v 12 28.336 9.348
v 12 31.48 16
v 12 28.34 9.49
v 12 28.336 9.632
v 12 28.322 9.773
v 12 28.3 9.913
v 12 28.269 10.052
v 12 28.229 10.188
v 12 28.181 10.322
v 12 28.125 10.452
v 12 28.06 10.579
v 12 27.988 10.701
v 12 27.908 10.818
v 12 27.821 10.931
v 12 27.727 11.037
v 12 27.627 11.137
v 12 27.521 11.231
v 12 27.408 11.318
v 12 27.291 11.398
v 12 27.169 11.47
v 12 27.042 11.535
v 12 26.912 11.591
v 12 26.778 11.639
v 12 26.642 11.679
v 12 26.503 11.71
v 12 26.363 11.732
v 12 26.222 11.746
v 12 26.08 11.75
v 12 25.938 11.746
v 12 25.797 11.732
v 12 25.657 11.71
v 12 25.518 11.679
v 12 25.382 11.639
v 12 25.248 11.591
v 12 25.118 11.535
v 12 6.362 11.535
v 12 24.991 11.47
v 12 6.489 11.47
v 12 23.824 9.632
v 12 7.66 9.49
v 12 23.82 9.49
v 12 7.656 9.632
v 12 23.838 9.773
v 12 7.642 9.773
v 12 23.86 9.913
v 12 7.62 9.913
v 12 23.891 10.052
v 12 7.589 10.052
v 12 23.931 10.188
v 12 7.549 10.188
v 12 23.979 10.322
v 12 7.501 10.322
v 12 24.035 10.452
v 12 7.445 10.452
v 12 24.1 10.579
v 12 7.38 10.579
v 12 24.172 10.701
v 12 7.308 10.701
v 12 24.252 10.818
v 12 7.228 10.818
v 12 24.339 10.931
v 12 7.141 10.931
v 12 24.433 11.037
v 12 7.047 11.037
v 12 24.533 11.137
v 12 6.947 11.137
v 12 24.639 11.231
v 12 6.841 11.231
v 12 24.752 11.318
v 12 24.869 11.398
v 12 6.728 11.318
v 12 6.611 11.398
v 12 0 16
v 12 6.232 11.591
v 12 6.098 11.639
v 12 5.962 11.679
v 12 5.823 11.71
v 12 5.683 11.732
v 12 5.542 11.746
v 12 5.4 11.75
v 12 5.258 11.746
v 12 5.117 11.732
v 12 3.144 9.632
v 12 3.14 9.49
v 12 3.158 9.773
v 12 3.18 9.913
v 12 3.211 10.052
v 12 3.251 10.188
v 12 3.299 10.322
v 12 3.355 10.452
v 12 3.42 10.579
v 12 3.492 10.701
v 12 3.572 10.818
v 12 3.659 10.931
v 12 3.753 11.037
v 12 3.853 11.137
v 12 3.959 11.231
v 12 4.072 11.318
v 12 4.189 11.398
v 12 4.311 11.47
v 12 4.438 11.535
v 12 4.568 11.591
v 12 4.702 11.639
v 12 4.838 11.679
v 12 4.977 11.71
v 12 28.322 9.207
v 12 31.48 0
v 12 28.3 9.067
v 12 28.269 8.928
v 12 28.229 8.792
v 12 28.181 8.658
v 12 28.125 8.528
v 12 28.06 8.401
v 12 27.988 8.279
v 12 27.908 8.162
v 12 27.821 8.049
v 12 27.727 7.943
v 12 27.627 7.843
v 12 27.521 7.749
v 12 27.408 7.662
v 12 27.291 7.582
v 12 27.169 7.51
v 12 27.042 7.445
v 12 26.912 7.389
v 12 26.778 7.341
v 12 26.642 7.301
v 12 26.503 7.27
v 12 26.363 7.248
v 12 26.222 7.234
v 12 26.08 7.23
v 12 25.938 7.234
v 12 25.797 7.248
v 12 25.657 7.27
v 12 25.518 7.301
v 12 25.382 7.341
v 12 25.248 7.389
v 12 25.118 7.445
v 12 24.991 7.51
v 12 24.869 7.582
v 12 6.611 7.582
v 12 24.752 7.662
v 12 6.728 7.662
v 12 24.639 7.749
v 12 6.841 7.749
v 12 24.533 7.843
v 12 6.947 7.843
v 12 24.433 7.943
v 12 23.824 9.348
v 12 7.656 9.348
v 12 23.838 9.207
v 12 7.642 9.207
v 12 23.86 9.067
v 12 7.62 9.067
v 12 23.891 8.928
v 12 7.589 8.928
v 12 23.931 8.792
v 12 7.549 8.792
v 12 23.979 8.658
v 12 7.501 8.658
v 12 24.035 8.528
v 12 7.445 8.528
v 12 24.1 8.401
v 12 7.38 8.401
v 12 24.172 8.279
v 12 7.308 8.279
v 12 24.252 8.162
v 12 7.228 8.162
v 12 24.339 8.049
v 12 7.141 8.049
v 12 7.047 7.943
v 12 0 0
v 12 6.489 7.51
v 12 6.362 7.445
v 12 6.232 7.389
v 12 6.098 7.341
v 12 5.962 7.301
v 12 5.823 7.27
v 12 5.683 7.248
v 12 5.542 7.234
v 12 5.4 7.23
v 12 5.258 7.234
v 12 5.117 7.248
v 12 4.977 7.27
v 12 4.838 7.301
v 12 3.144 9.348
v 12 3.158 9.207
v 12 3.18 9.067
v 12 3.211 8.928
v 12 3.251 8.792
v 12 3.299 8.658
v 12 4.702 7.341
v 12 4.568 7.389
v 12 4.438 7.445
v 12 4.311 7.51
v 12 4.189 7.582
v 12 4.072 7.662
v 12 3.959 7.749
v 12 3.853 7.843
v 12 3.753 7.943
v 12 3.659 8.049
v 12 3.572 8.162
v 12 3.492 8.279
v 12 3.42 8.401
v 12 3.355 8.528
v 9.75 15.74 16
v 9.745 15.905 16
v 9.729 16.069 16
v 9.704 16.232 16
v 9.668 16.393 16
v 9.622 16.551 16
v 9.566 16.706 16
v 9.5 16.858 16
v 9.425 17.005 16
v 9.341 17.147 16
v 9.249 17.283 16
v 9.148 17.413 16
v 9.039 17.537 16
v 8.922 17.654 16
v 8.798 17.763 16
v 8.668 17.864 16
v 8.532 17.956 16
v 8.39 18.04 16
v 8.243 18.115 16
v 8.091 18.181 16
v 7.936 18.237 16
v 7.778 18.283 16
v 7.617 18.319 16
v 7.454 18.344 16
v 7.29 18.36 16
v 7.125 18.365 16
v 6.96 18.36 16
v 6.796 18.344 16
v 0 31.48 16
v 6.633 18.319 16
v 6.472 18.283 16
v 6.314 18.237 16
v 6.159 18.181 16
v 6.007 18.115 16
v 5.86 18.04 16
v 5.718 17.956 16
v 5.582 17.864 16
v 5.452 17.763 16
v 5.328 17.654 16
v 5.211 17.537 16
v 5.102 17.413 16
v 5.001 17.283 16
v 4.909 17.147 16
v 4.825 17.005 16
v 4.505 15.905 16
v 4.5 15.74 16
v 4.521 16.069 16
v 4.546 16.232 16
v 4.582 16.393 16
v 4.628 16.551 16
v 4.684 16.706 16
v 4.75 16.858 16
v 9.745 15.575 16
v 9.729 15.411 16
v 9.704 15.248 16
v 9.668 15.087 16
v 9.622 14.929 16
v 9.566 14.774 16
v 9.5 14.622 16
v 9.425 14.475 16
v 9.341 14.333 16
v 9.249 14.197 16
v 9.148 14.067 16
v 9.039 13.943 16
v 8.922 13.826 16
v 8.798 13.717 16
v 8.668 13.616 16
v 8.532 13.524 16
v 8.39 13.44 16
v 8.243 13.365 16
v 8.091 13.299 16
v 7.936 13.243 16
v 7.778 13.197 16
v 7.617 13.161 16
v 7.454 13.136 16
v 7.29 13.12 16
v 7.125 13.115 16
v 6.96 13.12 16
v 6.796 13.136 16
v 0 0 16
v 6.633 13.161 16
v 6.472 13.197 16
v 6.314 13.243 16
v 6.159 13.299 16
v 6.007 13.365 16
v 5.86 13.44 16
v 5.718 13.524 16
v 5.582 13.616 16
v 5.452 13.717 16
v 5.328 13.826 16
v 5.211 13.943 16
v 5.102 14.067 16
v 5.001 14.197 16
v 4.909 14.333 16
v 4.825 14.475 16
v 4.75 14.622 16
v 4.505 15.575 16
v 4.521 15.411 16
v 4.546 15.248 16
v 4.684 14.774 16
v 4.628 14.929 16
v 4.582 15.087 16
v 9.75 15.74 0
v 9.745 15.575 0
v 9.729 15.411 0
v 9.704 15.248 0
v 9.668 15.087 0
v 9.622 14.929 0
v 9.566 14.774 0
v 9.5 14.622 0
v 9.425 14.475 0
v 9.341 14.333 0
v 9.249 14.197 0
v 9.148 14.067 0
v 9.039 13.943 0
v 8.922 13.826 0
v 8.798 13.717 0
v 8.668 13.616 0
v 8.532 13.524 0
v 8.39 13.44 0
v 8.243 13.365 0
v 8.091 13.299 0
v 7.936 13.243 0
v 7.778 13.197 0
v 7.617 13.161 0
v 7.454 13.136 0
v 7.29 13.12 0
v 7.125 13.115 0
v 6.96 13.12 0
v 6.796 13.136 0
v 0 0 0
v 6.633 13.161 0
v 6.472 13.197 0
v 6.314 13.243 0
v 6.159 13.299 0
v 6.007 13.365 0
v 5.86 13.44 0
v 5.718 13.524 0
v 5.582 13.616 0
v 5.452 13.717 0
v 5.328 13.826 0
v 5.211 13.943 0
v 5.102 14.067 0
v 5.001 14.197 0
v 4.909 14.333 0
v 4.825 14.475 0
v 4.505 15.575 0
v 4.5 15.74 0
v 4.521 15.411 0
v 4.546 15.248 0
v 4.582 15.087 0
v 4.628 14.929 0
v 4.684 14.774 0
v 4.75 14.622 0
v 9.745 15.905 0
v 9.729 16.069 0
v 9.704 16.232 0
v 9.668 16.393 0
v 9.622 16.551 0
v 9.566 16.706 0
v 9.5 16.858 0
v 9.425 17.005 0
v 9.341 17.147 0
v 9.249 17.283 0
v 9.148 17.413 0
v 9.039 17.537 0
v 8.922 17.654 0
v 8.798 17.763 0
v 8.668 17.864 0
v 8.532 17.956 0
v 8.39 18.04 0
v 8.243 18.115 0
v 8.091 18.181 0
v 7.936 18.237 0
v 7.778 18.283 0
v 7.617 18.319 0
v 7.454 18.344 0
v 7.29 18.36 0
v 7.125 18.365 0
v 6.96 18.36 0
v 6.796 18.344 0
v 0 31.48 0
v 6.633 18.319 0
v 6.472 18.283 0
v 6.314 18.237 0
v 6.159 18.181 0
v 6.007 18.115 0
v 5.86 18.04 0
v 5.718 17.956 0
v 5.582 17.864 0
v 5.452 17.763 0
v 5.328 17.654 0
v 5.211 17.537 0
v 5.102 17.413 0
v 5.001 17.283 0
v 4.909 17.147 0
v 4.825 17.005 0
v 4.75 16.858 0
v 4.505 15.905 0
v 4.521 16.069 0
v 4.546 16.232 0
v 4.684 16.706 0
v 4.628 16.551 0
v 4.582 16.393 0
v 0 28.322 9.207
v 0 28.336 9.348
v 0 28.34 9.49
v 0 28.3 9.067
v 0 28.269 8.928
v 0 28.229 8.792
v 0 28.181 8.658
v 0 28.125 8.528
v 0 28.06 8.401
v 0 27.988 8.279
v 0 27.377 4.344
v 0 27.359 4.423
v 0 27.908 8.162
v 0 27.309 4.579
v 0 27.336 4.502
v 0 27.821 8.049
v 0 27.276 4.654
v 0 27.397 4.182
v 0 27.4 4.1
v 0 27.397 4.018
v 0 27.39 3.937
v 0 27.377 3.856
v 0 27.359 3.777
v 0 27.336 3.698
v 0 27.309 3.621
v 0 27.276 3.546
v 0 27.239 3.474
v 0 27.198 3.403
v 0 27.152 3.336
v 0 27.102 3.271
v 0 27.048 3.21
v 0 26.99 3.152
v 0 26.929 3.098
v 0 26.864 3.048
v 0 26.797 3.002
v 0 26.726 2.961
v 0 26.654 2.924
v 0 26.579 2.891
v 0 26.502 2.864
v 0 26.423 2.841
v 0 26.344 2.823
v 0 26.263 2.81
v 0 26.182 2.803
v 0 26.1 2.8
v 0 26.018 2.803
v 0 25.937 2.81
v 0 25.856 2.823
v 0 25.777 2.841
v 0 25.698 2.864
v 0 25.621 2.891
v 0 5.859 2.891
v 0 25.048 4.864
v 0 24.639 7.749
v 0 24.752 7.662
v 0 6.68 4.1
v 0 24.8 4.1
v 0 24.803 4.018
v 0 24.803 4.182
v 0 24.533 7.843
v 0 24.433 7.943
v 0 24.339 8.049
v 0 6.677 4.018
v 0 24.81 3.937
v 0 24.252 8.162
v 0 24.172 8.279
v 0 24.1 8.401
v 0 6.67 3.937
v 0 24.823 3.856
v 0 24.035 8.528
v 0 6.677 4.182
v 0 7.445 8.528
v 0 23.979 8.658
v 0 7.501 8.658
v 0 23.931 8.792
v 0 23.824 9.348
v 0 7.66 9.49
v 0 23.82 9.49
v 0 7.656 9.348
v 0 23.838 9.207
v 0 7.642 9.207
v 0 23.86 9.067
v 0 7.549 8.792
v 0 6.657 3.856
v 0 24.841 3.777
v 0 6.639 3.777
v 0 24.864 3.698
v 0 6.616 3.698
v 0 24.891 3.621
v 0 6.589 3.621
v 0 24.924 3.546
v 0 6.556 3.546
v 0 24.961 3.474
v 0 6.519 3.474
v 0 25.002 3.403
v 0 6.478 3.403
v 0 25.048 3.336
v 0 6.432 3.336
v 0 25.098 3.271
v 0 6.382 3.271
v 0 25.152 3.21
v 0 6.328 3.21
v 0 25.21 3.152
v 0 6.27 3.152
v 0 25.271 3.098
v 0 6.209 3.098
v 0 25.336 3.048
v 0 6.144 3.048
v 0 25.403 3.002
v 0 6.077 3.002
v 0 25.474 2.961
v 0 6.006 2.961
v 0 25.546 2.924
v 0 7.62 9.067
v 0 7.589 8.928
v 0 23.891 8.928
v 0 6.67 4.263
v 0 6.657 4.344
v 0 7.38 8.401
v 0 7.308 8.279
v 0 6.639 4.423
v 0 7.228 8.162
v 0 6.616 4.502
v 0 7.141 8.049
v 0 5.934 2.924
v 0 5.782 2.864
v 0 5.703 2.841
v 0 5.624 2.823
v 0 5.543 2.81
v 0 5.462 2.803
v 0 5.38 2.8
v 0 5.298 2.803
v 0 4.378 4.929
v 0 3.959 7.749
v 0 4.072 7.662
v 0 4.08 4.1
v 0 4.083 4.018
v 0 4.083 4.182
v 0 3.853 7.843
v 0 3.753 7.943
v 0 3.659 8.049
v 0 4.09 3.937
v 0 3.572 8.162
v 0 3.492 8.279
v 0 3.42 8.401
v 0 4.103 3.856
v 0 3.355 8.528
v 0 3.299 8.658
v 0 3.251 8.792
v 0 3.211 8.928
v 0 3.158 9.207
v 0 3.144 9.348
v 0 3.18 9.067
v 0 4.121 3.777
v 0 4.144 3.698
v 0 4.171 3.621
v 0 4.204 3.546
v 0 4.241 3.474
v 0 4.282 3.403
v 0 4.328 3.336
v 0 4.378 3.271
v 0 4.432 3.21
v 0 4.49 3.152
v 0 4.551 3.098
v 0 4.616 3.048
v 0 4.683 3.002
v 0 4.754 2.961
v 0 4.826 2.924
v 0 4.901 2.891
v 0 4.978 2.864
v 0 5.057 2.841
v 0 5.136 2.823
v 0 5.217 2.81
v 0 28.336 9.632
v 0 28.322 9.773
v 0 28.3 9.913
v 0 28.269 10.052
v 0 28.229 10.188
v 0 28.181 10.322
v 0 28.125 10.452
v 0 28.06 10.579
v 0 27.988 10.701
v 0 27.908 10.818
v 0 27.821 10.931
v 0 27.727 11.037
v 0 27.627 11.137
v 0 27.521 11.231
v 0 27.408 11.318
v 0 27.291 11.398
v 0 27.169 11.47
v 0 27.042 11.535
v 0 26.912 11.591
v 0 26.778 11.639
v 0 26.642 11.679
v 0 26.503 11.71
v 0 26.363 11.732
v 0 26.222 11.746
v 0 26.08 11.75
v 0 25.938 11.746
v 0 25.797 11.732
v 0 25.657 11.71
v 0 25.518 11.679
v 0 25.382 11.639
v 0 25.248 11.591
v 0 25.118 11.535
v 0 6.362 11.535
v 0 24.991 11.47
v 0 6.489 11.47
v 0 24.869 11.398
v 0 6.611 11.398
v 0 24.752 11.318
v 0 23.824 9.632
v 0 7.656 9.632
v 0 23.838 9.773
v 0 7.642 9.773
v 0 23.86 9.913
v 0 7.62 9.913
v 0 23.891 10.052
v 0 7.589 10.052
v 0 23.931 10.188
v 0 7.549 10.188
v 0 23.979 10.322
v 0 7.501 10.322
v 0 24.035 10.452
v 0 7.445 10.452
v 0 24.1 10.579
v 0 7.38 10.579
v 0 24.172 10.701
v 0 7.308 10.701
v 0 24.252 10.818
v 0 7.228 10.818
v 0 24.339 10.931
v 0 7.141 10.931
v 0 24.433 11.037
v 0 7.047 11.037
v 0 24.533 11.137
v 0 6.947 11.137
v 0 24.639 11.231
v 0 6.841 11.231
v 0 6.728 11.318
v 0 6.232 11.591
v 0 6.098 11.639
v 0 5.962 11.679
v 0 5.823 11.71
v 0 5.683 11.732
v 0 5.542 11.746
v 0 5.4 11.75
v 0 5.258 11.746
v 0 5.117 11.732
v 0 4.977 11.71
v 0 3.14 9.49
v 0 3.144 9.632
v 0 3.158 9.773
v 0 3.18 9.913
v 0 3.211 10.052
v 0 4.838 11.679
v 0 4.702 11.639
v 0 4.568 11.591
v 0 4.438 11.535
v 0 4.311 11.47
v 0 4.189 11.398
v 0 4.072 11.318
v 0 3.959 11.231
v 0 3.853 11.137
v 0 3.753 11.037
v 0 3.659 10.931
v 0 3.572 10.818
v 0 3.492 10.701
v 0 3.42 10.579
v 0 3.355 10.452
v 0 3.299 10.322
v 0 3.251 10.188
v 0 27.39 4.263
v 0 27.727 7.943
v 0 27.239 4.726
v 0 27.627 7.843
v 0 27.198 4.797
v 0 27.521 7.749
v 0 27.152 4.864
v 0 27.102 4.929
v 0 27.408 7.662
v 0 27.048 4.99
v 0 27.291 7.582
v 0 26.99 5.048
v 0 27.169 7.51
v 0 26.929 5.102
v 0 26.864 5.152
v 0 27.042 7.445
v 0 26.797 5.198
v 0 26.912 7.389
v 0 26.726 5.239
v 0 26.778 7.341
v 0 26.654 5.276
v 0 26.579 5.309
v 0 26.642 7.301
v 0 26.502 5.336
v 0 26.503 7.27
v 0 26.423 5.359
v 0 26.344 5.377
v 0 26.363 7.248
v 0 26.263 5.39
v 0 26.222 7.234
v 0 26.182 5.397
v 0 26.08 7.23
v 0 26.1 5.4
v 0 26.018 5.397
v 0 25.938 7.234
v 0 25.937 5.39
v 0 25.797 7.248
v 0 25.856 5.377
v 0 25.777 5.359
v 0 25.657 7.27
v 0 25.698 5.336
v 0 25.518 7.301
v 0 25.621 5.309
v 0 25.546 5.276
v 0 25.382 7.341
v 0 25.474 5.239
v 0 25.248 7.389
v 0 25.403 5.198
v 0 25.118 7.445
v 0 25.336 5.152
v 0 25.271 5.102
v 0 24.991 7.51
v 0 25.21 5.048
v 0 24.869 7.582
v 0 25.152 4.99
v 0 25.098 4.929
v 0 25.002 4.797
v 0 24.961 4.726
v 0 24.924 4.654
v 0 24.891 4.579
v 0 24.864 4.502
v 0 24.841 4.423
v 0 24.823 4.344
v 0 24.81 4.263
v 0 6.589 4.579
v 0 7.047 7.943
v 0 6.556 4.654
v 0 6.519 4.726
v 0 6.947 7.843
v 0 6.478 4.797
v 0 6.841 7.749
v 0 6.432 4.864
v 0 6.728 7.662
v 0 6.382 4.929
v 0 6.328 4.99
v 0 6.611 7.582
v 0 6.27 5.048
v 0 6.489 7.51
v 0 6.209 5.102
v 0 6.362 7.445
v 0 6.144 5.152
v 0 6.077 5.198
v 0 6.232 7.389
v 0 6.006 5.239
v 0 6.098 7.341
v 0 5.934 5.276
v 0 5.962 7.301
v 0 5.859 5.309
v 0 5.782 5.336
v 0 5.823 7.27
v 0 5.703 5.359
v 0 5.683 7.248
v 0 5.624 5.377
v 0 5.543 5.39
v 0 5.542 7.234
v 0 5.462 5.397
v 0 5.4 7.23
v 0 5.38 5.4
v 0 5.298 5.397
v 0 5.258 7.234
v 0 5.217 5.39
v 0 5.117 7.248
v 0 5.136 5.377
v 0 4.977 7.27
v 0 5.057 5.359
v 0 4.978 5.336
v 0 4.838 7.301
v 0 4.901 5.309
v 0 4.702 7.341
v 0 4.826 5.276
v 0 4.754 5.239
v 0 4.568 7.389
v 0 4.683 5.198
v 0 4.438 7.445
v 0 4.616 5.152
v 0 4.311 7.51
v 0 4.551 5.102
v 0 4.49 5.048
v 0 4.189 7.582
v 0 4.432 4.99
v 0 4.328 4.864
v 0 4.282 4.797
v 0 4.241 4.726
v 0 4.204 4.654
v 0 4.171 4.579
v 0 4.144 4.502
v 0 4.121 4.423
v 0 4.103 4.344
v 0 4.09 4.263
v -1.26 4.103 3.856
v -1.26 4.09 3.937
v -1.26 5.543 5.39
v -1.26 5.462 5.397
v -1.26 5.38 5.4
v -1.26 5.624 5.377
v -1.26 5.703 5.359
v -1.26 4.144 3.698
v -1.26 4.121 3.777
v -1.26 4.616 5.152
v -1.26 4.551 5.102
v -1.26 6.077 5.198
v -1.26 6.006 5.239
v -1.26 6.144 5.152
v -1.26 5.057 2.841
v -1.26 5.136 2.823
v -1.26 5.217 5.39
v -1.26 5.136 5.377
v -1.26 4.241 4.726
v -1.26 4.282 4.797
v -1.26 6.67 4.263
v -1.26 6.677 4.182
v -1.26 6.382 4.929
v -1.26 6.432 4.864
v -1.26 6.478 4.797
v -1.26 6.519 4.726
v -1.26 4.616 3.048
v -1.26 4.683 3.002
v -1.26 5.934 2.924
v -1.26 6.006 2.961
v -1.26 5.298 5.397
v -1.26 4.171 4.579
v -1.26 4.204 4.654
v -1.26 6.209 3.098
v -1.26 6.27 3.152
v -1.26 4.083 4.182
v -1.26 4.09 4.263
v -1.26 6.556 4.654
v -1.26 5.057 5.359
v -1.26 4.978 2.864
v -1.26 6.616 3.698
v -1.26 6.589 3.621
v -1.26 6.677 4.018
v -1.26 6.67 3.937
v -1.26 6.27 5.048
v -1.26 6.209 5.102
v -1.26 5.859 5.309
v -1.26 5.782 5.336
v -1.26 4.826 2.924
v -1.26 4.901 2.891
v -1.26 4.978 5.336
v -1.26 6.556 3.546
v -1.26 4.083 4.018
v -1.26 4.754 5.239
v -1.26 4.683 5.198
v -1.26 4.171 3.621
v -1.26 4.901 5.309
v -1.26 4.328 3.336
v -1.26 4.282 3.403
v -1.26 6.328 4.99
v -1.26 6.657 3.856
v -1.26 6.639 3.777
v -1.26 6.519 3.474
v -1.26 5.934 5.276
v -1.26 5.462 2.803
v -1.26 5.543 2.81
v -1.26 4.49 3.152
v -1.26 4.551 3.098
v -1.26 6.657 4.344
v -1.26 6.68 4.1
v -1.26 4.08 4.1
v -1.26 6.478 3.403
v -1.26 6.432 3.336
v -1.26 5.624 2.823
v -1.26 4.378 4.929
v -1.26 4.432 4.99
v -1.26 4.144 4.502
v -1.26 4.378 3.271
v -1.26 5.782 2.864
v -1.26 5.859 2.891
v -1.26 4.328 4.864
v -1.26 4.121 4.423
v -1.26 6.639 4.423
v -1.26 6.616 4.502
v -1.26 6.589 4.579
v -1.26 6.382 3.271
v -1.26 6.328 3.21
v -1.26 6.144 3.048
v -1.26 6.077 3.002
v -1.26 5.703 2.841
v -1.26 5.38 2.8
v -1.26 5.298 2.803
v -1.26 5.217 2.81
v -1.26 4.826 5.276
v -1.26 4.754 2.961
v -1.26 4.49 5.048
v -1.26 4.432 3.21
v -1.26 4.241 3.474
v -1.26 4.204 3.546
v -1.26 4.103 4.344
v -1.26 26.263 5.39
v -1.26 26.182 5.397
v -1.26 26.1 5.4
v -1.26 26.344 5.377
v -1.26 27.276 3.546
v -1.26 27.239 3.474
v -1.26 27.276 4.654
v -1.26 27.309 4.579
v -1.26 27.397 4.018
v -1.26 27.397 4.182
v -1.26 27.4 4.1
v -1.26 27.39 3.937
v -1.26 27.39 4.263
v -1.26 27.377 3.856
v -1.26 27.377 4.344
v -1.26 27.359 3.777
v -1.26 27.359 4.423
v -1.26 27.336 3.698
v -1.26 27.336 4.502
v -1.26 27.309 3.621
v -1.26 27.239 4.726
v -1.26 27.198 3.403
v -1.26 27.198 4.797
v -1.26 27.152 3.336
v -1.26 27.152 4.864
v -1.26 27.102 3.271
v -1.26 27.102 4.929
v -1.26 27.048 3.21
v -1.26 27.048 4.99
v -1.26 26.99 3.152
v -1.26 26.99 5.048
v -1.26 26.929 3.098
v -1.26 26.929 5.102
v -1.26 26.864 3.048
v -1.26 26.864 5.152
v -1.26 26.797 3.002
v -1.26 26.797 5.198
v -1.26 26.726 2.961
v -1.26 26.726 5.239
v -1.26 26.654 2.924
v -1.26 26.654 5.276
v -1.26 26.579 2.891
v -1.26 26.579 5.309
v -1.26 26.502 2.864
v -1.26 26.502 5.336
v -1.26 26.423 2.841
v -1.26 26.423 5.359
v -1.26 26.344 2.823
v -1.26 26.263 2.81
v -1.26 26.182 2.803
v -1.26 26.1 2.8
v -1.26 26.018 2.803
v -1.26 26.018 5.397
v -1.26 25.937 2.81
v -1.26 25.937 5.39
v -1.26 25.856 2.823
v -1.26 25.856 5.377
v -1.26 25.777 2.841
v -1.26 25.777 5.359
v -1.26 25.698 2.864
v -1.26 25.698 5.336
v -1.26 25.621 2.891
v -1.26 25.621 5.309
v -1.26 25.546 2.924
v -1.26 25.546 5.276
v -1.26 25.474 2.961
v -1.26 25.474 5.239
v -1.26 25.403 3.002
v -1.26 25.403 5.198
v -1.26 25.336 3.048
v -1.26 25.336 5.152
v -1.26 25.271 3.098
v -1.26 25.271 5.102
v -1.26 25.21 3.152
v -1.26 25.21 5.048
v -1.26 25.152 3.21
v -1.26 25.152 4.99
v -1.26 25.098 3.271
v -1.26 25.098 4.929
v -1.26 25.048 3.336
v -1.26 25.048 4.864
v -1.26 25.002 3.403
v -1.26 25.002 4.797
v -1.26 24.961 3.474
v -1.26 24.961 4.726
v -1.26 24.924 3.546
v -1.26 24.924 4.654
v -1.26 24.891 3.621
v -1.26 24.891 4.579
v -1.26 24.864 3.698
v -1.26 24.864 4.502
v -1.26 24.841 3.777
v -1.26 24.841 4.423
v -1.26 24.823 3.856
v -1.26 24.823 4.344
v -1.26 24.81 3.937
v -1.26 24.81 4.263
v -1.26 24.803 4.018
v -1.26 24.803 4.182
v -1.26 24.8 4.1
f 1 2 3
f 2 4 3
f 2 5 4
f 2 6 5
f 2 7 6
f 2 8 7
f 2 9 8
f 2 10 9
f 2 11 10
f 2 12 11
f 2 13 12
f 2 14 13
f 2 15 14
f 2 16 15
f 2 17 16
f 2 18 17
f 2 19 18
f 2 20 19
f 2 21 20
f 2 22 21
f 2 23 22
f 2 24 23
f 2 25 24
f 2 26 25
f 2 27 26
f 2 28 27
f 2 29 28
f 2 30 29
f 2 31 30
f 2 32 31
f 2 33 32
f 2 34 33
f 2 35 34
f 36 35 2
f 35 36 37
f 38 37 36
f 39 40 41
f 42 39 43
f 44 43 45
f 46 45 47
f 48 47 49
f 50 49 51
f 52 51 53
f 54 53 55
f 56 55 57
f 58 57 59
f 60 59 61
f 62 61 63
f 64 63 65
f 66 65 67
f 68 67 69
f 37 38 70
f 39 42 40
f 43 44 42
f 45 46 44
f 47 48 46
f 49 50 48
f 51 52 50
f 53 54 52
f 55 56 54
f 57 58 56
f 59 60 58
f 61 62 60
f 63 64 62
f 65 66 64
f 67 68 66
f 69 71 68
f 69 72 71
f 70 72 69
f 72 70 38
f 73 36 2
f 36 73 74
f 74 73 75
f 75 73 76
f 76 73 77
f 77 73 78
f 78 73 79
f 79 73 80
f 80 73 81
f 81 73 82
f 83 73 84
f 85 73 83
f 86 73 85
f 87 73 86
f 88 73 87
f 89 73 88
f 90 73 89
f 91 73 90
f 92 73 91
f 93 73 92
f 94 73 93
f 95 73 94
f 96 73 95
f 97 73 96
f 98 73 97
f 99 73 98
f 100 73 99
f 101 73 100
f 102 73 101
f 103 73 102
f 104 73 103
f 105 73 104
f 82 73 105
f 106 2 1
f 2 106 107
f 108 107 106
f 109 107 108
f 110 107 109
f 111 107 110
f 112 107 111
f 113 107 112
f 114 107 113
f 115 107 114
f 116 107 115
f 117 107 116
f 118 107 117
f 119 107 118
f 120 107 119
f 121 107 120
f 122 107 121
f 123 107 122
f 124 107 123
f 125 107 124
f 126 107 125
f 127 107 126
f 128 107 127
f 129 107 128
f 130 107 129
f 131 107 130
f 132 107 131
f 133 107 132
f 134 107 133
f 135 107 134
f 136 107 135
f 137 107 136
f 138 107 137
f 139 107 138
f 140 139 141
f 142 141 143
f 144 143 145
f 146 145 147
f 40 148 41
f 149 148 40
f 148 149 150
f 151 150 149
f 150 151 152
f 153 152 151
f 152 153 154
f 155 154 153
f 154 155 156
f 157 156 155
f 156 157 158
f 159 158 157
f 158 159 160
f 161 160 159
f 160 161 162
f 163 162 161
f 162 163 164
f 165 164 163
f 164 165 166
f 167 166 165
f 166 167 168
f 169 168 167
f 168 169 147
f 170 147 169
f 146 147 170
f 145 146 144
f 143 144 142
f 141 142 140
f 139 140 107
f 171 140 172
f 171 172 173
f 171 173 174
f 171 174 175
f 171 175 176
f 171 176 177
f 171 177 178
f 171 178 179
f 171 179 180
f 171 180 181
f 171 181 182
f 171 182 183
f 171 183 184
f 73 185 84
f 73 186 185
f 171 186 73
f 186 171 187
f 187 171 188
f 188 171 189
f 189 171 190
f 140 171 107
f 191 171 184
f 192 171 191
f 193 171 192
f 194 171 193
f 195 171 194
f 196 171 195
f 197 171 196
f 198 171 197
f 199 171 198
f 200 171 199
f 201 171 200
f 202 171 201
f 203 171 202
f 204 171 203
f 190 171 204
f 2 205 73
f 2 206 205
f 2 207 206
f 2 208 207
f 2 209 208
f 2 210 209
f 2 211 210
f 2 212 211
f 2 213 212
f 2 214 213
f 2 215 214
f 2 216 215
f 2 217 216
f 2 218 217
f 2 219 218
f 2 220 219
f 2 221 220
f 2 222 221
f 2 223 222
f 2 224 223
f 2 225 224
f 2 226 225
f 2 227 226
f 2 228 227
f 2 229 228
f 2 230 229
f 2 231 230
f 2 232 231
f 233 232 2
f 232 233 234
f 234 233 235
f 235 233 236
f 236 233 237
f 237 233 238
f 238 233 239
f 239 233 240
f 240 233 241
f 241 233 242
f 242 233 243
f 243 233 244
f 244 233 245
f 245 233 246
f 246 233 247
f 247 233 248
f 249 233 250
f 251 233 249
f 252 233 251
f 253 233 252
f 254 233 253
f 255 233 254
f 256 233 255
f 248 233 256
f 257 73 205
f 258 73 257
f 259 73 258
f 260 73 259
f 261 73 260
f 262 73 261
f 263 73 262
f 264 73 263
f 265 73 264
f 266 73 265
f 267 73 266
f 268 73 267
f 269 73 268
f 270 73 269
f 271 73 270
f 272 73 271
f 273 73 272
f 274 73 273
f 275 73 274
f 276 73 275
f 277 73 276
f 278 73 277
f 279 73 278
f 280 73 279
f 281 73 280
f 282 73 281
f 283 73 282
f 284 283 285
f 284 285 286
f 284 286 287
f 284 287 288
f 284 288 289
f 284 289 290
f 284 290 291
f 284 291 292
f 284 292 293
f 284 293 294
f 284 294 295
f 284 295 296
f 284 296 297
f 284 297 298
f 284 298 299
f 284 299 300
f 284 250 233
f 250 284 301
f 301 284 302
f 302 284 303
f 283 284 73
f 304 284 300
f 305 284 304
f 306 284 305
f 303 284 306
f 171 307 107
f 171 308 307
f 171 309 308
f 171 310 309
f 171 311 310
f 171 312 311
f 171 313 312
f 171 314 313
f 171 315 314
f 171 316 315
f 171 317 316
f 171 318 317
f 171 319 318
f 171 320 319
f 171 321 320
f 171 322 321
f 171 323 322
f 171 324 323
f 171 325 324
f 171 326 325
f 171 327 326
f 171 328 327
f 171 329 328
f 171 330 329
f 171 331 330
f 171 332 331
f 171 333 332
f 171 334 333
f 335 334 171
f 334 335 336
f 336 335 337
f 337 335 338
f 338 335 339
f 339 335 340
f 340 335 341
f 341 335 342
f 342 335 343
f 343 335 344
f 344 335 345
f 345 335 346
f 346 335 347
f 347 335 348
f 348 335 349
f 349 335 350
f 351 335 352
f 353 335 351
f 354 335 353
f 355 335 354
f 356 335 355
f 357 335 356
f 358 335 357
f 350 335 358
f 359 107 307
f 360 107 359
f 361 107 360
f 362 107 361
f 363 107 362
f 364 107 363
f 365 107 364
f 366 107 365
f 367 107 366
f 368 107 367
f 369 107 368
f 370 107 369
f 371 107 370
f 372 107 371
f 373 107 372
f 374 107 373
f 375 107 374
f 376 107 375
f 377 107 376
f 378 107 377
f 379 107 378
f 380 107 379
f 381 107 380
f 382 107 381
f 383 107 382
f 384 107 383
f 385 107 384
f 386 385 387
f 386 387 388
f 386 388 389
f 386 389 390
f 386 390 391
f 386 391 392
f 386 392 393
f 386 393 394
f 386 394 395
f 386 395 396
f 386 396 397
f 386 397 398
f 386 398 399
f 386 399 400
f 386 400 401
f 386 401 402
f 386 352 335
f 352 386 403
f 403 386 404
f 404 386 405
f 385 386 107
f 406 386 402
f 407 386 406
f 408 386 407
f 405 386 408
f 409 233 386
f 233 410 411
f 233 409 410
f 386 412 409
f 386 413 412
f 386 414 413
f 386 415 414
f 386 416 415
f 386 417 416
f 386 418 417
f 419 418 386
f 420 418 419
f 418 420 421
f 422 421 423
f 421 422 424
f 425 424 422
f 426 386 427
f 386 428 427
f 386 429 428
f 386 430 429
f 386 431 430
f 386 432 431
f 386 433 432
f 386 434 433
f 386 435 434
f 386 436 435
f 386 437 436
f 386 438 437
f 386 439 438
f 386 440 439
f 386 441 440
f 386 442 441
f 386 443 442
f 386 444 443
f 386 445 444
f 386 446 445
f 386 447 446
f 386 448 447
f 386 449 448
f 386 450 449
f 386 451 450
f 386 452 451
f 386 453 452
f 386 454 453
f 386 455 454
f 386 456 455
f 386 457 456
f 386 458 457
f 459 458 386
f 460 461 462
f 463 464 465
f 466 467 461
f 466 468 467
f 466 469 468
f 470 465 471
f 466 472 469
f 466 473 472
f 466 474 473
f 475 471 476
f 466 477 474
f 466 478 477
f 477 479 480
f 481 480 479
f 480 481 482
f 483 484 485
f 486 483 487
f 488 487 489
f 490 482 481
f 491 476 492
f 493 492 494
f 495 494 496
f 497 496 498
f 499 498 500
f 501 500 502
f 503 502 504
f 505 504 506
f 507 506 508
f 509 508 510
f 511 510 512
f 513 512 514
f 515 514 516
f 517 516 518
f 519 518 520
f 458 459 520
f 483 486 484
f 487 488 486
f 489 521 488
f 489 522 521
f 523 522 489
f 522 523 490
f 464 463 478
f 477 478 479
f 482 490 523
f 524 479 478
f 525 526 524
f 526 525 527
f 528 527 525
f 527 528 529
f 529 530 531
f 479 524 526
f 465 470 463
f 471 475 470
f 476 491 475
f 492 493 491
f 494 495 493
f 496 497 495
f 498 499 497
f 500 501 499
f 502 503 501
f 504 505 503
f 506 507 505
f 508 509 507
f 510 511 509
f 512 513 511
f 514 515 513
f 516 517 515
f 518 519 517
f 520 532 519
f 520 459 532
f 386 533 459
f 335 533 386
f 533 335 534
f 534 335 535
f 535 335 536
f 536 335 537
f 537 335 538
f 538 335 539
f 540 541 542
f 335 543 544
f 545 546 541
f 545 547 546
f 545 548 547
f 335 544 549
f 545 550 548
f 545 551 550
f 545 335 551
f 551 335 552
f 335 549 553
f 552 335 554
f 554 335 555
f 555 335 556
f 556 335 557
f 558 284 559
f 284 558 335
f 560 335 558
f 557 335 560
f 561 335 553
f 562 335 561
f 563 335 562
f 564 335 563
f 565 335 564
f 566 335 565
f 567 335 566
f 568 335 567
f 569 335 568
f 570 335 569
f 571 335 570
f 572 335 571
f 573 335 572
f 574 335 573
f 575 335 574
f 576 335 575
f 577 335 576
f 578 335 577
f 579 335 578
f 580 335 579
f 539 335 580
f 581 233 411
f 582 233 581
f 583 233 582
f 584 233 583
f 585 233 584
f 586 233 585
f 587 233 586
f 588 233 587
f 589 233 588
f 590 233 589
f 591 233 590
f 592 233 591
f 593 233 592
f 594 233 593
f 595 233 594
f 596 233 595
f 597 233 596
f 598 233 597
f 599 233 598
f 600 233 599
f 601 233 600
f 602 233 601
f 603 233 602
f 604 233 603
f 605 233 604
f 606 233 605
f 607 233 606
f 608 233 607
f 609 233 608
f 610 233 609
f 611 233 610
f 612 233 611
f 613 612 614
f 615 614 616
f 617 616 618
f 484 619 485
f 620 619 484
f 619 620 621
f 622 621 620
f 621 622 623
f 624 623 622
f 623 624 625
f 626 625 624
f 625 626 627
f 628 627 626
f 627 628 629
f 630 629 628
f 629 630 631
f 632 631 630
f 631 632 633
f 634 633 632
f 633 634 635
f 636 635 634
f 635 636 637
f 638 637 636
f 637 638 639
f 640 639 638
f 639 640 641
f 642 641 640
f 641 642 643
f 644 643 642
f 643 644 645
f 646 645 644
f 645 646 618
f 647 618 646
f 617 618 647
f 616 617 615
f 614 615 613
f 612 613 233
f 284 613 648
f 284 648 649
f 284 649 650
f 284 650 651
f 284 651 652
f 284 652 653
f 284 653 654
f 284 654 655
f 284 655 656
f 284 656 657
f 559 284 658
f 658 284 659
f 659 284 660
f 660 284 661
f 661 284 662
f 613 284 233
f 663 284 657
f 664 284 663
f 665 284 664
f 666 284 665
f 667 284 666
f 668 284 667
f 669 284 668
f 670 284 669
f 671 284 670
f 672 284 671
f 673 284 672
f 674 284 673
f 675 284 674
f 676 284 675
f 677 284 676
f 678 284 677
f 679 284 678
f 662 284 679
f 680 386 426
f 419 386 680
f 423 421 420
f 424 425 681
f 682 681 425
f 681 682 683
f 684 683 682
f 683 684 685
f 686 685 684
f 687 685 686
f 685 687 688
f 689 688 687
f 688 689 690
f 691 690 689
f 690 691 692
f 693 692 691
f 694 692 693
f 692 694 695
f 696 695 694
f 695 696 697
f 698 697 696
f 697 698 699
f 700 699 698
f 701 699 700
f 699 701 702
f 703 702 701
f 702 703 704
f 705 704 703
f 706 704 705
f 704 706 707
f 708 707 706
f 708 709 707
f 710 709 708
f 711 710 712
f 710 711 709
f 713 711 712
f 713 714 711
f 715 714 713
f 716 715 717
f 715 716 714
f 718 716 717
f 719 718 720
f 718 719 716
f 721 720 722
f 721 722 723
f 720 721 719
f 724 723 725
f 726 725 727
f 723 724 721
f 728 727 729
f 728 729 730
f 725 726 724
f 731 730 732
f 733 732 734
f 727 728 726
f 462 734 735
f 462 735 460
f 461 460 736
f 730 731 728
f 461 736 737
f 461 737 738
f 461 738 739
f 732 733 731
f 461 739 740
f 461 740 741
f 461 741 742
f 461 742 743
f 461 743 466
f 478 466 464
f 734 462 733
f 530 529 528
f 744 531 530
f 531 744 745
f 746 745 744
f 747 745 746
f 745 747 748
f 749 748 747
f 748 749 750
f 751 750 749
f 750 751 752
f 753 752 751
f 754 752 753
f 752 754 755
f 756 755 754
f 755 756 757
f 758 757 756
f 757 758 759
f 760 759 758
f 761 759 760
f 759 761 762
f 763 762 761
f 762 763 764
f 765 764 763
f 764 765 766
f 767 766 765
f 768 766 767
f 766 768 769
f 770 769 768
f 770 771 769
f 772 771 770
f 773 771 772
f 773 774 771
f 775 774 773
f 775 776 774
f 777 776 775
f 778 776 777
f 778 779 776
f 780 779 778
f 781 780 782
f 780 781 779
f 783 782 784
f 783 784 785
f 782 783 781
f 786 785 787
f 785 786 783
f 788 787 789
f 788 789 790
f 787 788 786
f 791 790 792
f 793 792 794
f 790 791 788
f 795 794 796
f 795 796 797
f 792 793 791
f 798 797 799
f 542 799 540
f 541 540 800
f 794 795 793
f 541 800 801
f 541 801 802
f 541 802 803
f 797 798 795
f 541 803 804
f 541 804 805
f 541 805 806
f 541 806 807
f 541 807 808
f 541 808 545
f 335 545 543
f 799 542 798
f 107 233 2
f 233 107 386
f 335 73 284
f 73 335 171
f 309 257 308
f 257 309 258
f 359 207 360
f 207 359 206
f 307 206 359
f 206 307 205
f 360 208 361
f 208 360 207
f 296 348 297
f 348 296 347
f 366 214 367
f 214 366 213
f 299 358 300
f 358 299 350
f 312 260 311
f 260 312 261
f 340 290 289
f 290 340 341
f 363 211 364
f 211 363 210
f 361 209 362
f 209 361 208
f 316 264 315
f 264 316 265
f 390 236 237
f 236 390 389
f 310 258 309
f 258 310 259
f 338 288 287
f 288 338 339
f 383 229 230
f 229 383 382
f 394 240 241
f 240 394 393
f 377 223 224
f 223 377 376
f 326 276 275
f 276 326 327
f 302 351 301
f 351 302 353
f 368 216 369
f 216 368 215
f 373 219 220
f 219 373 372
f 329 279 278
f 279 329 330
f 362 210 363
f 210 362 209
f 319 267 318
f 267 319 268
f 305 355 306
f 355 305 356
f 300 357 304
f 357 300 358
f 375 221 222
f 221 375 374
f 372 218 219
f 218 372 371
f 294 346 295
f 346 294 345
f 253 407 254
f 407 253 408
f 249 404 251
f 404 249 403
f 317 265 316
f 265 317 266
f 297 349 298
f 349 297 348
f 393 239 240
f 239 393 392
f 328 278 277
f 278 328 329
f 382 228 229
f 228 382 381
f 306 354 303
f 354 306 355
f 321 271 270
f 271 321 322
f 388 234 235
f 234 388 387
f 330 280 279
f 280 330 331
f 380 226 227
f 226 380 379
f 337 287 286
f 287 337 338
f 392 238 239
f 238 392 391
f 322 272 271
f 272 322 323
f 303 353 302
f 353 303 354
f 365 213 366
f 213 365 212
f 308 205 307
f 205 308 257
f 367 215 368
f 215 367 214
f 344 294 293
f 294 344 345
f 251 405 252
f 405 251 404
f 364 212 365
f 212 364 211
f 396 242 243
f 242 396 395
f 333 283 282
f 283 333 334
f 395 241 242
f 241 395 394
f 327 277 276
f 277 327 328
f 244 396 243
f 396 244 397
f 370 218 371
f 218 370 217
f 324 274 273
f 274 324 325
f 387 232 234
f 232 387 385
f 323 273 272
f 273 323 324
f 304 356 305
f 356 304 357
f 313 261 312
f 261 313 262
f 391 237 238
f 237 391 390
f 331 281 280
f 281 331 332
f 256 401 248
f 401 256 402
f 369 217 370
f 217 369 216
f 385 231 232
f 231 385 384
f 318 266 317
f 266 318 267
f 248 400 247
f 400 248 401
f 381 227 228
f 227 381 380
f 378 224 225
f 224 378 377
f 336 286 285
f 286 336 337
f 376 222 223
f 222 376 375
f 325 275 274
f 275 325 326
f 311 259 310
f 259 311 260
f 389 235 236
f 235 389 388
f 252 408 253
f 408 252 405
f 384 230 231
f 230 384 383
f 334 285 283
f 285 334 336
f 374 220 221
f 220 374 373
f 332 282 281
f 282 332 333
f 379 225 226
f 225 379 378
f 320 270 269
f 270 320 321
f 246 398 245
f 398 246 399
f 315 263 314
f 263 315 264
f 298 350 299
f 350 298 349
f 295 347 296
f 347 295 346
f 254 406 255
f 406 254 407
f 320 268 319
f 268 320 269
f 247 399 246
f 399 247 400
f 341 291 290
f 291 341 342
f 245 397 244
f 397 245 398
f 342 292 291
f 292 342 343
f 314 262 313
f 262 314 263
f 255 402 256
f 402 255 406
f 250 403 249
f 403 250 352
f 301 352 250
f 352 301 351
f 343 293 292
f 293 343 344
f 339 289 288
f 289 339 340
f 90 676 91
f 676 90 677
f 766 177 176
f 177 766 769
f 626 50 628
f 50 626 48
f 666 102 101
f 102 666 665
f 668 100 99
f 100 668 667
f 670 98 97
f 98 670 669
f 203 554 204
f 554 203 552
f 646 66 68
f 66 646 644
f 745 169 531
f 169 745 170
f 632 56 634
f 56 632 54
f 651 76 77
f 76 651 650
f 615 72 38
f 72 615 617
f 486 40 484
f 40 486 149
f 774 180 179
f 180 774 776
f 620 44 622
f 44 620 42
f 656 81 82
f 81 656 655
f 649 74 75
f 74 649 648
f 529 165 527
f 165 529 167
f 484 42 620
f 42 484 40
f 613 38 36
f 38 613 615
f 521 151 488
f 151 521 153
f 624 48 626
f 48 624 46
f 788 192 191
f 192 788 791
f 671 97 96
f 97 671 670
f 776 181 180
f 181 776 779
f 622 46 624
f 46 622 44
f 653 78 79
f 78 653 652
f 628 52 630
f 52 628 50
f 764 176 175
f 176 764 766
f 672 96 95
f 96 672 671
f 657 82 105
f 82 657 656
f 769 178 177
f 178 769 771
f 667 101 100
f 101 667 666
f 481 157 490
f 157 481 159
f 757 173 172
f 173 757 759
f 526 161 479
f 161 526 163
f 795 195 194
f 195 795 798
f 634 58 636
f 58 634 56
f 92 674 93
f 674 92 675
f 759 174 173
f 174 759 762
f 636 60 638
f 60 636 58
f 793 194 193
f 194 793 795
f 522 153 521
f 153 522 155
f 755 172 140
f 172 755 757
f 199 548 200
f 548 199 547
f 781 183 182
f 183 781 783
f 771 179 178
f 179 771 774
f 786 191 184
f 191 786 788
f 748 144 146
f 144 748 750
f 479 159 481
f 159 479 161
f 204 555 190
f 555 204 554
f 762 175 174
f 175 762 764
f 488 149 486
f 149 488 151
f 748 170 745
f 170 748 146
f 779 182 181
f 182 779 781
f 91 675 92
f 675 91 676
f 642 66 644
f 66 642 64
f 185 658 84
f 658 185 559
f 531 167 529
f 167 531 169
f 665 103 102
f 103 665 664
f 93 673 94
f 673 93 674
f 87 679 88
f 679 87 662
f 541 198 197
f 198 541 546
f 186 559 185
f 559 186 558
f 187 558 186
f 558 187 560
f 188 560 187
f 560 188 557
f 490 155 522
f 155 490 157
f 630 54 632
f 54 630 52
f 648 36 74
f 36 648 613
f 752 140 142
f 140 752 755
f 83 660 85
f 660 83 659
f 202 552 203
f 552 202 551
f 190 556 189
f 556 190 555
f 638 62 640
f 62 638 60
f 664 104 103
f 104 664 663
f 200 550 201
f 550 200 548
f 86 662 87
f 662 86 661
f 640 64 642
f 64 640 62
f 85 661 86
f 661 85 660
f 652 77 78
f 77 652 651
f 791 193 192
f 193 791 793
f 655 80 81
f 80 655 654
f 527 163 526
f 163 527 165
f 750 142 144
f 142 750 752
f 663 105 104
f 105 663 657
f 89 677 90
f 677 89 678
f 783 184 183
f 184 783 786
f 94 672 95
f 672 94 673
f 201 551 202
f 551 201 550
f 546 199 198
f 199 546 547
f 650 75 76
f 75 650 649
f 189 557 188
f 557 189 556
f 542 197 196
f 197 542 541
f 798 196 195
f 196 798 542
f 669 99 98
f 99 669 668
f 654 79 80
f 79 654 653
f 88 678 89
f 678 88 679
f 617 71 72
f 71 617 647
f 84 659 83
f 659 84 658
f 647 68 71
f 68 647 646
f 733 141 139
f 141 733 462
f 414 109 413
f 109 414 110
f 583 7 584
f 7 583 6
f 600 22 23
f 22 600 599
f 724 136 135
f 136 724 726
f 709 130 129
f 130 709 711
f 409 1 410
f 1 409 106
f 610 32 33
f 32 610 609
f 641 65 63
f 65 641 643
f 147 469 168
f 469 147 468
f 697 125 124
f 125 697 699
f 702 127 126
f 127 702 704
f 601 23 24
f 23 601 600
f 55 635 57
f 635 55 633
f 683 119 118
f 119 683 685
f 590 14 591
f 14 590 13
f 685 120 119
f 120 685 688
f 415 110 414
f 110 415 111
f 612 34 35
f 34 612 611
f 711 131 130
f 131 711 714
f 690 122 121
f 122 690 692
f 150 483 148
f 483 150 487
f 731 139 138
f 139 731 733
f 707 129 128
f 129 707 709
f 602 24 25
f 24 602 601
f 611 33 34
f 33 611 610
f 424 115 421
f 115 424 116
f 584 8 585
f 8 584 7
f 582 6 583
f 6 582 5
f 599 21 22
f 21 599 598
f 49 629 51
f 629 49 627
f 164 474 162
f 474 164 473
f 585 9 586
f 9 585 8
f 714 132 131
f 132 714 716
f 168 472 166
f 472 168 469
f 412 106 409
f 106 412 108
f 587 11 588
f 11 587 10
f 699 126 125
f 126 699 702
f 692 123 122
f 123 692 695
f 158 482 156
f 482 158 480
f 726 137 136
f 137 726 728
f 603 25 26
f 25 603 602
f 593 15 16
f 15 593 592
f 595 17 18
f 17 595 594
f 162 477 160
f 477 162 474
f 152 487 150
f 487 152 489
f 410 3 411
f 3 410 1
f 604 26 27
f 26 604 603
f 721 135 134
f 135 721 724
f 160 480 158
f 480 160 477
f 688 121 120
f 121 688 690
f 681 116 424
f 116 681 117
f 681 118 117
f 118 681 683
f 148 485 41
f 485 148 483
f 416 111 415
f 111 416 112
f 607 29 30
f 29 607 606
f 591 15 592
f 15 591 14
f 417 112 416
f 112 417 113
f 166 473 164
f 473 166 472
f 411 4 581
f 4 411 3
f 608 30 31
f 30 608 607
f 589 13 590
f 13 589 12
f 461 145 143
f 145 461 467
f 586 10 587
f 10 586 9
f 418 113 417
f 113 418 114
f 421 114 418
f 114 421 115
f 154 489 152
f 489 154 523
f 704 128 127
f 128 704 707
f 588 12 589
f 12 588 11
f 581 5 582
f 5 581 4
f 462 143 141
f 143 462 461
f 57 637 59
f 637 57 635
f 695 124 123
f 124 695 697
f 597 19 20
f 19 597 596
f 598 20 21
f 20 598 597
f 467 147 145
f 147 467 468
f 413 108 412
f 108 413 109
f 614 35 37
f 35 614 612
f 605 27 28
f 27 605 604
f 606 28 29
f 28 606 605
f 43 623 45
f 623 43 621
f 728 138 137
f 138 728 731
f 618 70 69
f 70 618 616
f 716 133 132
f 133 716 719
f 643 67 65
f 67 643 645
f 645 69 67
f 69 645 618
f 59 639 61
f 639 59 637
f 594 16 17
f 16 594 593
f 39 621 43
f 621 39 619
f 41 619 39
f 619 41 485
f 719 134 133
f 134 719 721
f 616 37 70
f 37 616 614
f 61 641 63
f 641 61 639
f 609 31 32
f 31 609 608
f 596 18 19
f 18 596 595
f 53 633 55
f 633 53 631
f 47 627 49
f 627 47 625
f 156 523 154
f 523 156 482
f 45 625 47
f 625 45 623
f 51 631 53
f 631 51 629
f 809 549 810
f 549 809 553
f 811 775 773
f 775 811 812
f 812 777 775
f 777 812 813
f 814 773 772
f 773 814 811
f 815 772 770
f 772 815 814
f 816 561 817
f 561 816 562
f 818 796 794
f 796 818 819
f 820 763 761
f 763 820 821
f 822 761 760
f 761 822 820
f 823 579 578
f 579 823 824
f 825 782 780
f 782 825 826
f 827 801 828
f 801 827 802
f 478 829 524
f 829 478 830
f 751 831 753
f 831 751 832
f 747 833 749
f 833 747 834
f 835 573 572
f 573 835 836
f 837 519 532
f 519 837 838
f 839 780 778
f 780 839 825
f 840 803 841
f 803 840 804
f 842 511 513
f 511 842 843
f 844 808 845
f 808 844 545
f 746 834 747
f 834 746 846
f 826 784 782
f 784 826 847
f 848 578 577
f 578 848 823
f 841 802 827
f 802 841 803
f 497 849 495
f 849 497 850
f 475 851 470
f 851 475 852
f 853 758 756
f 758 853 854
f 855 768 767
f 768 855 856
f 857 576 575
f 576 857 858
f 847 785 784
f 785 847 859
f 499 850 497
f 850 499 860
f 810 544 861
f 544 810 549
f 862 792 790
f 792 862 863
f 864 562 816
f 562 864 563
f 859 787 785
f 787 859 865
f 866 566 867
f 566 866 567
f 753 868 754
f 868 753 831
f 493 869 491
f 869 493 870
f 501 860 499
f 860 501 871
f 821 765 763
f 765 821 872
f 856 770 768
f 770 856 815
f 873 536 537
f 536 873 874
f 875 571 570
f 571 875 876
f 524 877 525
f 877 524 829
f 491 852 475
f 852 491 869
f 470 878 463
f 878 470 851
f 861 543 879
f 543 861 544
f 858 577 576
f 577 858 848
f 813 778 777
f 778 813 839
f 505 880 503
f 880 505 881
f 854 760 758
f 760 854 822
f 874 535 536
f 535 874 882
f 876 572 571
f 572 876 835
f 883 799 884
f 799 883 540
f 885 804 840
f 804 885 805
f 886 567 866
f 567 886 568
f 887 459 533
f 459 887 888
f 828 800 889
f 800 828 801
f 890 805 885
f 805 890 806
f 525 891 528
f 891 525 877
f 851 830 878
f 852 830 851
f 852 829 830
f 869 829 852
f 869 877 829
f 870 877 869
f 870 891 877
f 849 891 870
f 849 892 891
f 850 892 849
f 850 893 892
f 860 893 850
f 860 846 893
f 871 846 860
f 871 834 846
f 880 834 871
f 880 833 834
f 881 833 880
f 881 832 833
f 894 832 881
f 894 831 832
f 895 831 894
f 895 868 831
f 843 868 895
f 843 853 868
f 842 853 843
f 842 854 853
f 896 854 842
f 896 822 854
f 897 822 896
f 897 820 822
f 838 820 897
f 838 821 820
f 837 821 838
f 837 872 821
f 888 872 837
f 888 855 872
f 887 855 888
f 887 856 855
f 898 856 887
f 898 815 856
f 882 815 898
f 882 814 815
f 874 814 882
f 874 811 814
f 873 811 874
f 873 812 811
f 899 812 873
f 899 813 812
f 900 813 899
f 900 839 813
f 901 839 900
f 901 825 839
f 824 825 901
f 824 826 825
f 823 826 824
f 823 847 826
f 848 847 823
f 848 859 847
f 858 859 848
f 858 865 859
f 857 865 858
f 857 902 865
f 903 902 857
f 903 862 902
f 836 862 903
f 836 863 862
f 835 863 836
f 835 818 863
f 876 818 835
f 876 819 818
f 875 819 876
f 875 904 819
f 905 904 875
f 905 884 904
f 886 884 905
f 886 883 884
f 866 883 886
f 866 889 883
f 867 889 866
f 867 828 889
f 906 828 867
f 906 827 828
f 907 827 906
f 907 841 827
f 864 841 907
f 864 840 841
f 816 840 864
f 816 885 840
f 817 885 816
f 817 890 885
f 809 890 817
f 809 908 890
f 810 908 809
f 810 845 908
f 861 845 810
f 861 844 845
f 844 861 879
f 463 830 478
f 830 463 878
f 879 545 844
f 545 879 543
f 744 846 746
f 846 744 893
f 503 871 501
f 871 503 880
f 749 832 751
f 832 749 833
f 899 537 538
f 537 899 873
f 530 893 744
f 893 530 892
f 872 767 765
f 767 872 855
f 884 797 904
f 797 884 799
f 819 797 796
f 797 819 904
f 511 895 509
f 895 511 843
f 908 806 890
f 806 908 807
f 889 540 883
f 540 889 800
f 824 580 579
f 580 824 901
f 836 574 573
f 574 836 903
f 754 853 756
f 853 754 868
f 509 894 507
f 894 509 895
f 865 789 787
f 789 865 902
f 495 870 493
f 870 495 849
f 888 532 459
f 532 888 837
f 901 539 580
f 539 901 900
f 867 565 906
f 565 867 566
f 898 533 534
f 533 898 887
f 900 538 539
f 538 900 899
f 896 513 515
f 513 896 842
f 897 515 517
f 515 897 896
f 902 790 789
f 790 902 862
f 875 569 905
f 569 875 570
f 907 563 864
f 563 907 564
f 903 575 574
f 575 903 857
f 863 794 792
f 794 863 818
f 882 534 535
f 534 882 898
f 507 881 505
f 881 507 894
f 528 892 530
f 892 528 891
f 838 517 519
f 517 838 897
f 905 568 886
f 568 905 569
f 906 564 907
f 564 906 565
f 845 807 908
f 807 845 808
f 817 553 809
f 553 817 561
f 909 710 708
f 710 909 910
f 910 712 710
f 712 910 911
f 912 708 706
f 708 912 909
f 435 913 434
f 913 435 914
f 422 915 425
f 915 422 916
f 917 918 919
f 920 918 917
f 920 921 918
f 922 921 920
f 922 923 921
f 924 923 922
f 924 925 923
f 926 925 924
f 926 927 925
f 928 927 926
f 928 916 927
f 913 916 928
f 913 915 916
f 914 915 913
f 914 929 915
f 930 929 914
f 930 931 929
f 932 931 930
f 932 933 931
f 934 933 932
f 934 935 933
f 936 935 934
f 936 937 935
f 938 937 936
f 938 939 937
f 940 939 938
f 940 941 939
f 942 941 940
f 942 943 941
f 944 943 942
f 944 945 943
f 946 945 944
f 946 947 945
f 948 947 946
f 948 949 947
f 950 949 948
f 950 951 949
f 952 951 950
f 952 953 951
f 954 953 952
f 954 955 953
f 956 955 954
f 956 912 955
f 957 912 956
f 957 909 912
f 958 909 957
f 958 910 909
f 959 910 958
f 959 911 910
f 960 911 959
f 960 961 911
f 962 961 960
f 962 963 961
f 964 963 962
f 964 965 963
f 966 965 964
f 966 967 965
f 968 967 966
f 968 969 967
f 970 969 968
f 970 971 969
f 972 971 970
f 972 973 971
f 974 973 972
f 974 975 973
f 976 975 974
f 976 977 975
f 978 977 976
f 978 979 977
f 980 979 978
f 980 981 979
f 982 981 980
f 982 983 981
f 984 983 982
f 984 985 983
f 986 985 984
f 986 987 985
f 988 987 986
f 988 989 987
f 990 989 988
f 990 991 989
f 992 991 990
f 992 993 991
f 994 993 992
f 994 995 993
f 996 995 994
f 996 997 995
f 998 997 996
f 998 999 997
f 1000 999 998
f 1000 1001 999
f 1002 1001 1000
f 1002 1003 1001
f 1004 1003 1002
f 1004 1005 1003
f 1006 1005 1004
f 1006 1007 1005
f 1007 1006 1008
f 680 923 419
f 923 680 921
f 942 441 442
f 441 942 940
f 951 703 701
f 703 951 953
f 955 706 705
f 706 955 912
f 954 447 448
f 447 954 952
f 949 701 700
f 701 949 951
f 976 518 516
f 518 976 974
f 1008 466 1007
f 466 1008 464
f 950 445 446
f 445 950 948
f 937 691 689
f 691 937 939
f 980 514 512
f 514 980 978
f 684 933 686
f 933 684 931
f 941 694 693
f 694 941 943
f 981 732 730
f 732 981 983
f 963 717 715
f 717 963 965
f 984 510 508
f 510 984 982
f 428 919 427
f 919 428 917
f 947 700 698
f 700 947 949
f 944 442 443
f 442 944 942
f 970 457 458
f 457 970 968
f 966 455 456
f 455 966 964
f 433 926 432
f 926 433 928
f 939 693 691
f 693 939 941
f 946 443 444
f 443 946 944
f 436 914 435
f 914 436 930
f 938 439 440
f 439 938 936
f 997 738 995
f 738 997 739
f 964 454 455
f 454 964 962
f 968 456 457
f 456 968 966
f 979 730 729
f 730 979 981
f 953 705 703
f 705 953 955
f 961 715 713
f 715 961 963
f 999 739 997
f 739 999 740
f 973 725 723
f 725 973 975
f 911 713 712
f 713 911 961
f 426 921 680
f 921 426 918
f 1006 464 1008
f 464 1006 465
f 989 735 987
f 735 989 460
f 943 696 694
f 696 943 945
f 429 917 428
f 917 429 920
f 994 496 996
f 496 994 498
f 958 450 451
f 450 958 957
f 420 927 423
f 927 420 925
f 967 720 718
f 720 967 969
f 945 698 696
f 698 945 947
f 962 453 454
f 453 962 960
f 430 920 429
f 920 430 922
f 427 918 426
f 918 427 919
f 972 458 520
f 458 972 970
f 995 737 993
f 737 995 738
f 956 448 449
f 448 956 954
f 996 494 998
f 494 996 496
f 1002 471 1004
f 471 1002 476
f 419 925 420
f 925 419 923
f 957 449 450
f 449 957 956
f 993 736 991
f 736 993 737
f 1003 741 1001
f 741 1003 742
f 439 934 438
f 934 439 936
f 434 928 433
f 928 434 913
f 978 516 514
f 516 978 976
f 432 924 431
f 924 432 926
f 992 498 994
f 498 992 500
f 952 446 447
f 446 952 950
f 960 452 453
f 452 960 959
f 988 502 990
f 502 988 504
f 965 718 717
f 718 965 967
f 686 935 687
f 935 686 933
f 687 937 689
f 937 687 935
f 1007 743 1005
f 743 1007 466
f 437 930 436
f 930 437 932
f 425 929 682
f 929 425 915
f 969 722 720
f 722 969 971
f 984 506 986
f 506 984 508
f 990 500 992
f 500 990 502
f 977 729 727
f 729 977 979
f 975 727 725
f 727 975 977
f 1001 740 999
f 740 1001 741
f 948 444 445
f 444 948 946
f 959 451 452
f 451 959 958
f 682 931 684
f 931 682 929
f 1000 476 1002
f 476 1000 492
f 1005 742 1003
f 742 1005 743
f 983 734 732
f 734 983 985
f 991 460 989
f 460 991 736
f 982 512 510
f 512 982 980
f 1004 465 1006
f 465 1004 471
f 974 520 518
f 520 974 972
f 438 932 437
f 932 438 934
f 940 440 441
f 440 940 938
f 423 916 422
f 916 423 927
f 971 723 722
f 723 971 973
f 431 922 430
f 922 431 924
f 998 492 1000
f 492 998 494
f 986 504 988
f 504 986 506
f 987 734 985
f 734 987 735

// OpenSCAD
 
height = 16;

block_width = 31.48;
thickness = 12;

screw_hole_diameter = 4.52;
screw_hole_distance_fromside = 3.14;
screw_hole_distance_from_bottom = height - screw_hole_diameter-4.25;

main_hole_diameter = 5.25; //actually 5.1 but have accoutn for tolorance of 3D print.
main_hole_distance_from_bottom = 4.5;

poep_distance_from_bottom = 2.8;
poep_diameter = 2.6;
poep_distance_from_side = 6.68-poep_diameter;


difference() {
    
    //main cube - main hole
    difference(){
        cube([thickness, block_width, height]);
        
        translate([main_hole_distance_from_bottom + main_hole_diameter/2, block_width/2]){
            cylinder(d=main_hole_diameter,h=height, $fn=100);
        }
        //screw holes
        translate([0, screw_hole_distance_fromside + screw_hole_diameter/2, screw_hole_distance_from_bottom + screw_hole_diameter/2])
            rotate(a = [0,90,0])
                cylinder(h=thickness, d=screw_hole_diameter, $fn=100);
        
        translate([0, block_width-screw_hole_distance_fromside- screw_hole_diameter/2, screw_hole_distance_from_bottom + screw_hole_diameter/2])
            rotate(a = [0,90,0])
                cylinder(h=thickness, d=screw_hole_diameter, $fn=100);
    
    }
}   

translate([0,0, 2.8+poep_diameter/2]){
    rotate([0,-90,0]){
        translate([0, poep_distance_from_side+poep_diameter/2, 0])cylinder(h=1.26, d=2.6, $fn=100);
        translate([0, block_width-poep_distance_from_side-poep_diameter/2, 0])cylinder(h=1.26, d=2.6, $fn=100);
    }
}
